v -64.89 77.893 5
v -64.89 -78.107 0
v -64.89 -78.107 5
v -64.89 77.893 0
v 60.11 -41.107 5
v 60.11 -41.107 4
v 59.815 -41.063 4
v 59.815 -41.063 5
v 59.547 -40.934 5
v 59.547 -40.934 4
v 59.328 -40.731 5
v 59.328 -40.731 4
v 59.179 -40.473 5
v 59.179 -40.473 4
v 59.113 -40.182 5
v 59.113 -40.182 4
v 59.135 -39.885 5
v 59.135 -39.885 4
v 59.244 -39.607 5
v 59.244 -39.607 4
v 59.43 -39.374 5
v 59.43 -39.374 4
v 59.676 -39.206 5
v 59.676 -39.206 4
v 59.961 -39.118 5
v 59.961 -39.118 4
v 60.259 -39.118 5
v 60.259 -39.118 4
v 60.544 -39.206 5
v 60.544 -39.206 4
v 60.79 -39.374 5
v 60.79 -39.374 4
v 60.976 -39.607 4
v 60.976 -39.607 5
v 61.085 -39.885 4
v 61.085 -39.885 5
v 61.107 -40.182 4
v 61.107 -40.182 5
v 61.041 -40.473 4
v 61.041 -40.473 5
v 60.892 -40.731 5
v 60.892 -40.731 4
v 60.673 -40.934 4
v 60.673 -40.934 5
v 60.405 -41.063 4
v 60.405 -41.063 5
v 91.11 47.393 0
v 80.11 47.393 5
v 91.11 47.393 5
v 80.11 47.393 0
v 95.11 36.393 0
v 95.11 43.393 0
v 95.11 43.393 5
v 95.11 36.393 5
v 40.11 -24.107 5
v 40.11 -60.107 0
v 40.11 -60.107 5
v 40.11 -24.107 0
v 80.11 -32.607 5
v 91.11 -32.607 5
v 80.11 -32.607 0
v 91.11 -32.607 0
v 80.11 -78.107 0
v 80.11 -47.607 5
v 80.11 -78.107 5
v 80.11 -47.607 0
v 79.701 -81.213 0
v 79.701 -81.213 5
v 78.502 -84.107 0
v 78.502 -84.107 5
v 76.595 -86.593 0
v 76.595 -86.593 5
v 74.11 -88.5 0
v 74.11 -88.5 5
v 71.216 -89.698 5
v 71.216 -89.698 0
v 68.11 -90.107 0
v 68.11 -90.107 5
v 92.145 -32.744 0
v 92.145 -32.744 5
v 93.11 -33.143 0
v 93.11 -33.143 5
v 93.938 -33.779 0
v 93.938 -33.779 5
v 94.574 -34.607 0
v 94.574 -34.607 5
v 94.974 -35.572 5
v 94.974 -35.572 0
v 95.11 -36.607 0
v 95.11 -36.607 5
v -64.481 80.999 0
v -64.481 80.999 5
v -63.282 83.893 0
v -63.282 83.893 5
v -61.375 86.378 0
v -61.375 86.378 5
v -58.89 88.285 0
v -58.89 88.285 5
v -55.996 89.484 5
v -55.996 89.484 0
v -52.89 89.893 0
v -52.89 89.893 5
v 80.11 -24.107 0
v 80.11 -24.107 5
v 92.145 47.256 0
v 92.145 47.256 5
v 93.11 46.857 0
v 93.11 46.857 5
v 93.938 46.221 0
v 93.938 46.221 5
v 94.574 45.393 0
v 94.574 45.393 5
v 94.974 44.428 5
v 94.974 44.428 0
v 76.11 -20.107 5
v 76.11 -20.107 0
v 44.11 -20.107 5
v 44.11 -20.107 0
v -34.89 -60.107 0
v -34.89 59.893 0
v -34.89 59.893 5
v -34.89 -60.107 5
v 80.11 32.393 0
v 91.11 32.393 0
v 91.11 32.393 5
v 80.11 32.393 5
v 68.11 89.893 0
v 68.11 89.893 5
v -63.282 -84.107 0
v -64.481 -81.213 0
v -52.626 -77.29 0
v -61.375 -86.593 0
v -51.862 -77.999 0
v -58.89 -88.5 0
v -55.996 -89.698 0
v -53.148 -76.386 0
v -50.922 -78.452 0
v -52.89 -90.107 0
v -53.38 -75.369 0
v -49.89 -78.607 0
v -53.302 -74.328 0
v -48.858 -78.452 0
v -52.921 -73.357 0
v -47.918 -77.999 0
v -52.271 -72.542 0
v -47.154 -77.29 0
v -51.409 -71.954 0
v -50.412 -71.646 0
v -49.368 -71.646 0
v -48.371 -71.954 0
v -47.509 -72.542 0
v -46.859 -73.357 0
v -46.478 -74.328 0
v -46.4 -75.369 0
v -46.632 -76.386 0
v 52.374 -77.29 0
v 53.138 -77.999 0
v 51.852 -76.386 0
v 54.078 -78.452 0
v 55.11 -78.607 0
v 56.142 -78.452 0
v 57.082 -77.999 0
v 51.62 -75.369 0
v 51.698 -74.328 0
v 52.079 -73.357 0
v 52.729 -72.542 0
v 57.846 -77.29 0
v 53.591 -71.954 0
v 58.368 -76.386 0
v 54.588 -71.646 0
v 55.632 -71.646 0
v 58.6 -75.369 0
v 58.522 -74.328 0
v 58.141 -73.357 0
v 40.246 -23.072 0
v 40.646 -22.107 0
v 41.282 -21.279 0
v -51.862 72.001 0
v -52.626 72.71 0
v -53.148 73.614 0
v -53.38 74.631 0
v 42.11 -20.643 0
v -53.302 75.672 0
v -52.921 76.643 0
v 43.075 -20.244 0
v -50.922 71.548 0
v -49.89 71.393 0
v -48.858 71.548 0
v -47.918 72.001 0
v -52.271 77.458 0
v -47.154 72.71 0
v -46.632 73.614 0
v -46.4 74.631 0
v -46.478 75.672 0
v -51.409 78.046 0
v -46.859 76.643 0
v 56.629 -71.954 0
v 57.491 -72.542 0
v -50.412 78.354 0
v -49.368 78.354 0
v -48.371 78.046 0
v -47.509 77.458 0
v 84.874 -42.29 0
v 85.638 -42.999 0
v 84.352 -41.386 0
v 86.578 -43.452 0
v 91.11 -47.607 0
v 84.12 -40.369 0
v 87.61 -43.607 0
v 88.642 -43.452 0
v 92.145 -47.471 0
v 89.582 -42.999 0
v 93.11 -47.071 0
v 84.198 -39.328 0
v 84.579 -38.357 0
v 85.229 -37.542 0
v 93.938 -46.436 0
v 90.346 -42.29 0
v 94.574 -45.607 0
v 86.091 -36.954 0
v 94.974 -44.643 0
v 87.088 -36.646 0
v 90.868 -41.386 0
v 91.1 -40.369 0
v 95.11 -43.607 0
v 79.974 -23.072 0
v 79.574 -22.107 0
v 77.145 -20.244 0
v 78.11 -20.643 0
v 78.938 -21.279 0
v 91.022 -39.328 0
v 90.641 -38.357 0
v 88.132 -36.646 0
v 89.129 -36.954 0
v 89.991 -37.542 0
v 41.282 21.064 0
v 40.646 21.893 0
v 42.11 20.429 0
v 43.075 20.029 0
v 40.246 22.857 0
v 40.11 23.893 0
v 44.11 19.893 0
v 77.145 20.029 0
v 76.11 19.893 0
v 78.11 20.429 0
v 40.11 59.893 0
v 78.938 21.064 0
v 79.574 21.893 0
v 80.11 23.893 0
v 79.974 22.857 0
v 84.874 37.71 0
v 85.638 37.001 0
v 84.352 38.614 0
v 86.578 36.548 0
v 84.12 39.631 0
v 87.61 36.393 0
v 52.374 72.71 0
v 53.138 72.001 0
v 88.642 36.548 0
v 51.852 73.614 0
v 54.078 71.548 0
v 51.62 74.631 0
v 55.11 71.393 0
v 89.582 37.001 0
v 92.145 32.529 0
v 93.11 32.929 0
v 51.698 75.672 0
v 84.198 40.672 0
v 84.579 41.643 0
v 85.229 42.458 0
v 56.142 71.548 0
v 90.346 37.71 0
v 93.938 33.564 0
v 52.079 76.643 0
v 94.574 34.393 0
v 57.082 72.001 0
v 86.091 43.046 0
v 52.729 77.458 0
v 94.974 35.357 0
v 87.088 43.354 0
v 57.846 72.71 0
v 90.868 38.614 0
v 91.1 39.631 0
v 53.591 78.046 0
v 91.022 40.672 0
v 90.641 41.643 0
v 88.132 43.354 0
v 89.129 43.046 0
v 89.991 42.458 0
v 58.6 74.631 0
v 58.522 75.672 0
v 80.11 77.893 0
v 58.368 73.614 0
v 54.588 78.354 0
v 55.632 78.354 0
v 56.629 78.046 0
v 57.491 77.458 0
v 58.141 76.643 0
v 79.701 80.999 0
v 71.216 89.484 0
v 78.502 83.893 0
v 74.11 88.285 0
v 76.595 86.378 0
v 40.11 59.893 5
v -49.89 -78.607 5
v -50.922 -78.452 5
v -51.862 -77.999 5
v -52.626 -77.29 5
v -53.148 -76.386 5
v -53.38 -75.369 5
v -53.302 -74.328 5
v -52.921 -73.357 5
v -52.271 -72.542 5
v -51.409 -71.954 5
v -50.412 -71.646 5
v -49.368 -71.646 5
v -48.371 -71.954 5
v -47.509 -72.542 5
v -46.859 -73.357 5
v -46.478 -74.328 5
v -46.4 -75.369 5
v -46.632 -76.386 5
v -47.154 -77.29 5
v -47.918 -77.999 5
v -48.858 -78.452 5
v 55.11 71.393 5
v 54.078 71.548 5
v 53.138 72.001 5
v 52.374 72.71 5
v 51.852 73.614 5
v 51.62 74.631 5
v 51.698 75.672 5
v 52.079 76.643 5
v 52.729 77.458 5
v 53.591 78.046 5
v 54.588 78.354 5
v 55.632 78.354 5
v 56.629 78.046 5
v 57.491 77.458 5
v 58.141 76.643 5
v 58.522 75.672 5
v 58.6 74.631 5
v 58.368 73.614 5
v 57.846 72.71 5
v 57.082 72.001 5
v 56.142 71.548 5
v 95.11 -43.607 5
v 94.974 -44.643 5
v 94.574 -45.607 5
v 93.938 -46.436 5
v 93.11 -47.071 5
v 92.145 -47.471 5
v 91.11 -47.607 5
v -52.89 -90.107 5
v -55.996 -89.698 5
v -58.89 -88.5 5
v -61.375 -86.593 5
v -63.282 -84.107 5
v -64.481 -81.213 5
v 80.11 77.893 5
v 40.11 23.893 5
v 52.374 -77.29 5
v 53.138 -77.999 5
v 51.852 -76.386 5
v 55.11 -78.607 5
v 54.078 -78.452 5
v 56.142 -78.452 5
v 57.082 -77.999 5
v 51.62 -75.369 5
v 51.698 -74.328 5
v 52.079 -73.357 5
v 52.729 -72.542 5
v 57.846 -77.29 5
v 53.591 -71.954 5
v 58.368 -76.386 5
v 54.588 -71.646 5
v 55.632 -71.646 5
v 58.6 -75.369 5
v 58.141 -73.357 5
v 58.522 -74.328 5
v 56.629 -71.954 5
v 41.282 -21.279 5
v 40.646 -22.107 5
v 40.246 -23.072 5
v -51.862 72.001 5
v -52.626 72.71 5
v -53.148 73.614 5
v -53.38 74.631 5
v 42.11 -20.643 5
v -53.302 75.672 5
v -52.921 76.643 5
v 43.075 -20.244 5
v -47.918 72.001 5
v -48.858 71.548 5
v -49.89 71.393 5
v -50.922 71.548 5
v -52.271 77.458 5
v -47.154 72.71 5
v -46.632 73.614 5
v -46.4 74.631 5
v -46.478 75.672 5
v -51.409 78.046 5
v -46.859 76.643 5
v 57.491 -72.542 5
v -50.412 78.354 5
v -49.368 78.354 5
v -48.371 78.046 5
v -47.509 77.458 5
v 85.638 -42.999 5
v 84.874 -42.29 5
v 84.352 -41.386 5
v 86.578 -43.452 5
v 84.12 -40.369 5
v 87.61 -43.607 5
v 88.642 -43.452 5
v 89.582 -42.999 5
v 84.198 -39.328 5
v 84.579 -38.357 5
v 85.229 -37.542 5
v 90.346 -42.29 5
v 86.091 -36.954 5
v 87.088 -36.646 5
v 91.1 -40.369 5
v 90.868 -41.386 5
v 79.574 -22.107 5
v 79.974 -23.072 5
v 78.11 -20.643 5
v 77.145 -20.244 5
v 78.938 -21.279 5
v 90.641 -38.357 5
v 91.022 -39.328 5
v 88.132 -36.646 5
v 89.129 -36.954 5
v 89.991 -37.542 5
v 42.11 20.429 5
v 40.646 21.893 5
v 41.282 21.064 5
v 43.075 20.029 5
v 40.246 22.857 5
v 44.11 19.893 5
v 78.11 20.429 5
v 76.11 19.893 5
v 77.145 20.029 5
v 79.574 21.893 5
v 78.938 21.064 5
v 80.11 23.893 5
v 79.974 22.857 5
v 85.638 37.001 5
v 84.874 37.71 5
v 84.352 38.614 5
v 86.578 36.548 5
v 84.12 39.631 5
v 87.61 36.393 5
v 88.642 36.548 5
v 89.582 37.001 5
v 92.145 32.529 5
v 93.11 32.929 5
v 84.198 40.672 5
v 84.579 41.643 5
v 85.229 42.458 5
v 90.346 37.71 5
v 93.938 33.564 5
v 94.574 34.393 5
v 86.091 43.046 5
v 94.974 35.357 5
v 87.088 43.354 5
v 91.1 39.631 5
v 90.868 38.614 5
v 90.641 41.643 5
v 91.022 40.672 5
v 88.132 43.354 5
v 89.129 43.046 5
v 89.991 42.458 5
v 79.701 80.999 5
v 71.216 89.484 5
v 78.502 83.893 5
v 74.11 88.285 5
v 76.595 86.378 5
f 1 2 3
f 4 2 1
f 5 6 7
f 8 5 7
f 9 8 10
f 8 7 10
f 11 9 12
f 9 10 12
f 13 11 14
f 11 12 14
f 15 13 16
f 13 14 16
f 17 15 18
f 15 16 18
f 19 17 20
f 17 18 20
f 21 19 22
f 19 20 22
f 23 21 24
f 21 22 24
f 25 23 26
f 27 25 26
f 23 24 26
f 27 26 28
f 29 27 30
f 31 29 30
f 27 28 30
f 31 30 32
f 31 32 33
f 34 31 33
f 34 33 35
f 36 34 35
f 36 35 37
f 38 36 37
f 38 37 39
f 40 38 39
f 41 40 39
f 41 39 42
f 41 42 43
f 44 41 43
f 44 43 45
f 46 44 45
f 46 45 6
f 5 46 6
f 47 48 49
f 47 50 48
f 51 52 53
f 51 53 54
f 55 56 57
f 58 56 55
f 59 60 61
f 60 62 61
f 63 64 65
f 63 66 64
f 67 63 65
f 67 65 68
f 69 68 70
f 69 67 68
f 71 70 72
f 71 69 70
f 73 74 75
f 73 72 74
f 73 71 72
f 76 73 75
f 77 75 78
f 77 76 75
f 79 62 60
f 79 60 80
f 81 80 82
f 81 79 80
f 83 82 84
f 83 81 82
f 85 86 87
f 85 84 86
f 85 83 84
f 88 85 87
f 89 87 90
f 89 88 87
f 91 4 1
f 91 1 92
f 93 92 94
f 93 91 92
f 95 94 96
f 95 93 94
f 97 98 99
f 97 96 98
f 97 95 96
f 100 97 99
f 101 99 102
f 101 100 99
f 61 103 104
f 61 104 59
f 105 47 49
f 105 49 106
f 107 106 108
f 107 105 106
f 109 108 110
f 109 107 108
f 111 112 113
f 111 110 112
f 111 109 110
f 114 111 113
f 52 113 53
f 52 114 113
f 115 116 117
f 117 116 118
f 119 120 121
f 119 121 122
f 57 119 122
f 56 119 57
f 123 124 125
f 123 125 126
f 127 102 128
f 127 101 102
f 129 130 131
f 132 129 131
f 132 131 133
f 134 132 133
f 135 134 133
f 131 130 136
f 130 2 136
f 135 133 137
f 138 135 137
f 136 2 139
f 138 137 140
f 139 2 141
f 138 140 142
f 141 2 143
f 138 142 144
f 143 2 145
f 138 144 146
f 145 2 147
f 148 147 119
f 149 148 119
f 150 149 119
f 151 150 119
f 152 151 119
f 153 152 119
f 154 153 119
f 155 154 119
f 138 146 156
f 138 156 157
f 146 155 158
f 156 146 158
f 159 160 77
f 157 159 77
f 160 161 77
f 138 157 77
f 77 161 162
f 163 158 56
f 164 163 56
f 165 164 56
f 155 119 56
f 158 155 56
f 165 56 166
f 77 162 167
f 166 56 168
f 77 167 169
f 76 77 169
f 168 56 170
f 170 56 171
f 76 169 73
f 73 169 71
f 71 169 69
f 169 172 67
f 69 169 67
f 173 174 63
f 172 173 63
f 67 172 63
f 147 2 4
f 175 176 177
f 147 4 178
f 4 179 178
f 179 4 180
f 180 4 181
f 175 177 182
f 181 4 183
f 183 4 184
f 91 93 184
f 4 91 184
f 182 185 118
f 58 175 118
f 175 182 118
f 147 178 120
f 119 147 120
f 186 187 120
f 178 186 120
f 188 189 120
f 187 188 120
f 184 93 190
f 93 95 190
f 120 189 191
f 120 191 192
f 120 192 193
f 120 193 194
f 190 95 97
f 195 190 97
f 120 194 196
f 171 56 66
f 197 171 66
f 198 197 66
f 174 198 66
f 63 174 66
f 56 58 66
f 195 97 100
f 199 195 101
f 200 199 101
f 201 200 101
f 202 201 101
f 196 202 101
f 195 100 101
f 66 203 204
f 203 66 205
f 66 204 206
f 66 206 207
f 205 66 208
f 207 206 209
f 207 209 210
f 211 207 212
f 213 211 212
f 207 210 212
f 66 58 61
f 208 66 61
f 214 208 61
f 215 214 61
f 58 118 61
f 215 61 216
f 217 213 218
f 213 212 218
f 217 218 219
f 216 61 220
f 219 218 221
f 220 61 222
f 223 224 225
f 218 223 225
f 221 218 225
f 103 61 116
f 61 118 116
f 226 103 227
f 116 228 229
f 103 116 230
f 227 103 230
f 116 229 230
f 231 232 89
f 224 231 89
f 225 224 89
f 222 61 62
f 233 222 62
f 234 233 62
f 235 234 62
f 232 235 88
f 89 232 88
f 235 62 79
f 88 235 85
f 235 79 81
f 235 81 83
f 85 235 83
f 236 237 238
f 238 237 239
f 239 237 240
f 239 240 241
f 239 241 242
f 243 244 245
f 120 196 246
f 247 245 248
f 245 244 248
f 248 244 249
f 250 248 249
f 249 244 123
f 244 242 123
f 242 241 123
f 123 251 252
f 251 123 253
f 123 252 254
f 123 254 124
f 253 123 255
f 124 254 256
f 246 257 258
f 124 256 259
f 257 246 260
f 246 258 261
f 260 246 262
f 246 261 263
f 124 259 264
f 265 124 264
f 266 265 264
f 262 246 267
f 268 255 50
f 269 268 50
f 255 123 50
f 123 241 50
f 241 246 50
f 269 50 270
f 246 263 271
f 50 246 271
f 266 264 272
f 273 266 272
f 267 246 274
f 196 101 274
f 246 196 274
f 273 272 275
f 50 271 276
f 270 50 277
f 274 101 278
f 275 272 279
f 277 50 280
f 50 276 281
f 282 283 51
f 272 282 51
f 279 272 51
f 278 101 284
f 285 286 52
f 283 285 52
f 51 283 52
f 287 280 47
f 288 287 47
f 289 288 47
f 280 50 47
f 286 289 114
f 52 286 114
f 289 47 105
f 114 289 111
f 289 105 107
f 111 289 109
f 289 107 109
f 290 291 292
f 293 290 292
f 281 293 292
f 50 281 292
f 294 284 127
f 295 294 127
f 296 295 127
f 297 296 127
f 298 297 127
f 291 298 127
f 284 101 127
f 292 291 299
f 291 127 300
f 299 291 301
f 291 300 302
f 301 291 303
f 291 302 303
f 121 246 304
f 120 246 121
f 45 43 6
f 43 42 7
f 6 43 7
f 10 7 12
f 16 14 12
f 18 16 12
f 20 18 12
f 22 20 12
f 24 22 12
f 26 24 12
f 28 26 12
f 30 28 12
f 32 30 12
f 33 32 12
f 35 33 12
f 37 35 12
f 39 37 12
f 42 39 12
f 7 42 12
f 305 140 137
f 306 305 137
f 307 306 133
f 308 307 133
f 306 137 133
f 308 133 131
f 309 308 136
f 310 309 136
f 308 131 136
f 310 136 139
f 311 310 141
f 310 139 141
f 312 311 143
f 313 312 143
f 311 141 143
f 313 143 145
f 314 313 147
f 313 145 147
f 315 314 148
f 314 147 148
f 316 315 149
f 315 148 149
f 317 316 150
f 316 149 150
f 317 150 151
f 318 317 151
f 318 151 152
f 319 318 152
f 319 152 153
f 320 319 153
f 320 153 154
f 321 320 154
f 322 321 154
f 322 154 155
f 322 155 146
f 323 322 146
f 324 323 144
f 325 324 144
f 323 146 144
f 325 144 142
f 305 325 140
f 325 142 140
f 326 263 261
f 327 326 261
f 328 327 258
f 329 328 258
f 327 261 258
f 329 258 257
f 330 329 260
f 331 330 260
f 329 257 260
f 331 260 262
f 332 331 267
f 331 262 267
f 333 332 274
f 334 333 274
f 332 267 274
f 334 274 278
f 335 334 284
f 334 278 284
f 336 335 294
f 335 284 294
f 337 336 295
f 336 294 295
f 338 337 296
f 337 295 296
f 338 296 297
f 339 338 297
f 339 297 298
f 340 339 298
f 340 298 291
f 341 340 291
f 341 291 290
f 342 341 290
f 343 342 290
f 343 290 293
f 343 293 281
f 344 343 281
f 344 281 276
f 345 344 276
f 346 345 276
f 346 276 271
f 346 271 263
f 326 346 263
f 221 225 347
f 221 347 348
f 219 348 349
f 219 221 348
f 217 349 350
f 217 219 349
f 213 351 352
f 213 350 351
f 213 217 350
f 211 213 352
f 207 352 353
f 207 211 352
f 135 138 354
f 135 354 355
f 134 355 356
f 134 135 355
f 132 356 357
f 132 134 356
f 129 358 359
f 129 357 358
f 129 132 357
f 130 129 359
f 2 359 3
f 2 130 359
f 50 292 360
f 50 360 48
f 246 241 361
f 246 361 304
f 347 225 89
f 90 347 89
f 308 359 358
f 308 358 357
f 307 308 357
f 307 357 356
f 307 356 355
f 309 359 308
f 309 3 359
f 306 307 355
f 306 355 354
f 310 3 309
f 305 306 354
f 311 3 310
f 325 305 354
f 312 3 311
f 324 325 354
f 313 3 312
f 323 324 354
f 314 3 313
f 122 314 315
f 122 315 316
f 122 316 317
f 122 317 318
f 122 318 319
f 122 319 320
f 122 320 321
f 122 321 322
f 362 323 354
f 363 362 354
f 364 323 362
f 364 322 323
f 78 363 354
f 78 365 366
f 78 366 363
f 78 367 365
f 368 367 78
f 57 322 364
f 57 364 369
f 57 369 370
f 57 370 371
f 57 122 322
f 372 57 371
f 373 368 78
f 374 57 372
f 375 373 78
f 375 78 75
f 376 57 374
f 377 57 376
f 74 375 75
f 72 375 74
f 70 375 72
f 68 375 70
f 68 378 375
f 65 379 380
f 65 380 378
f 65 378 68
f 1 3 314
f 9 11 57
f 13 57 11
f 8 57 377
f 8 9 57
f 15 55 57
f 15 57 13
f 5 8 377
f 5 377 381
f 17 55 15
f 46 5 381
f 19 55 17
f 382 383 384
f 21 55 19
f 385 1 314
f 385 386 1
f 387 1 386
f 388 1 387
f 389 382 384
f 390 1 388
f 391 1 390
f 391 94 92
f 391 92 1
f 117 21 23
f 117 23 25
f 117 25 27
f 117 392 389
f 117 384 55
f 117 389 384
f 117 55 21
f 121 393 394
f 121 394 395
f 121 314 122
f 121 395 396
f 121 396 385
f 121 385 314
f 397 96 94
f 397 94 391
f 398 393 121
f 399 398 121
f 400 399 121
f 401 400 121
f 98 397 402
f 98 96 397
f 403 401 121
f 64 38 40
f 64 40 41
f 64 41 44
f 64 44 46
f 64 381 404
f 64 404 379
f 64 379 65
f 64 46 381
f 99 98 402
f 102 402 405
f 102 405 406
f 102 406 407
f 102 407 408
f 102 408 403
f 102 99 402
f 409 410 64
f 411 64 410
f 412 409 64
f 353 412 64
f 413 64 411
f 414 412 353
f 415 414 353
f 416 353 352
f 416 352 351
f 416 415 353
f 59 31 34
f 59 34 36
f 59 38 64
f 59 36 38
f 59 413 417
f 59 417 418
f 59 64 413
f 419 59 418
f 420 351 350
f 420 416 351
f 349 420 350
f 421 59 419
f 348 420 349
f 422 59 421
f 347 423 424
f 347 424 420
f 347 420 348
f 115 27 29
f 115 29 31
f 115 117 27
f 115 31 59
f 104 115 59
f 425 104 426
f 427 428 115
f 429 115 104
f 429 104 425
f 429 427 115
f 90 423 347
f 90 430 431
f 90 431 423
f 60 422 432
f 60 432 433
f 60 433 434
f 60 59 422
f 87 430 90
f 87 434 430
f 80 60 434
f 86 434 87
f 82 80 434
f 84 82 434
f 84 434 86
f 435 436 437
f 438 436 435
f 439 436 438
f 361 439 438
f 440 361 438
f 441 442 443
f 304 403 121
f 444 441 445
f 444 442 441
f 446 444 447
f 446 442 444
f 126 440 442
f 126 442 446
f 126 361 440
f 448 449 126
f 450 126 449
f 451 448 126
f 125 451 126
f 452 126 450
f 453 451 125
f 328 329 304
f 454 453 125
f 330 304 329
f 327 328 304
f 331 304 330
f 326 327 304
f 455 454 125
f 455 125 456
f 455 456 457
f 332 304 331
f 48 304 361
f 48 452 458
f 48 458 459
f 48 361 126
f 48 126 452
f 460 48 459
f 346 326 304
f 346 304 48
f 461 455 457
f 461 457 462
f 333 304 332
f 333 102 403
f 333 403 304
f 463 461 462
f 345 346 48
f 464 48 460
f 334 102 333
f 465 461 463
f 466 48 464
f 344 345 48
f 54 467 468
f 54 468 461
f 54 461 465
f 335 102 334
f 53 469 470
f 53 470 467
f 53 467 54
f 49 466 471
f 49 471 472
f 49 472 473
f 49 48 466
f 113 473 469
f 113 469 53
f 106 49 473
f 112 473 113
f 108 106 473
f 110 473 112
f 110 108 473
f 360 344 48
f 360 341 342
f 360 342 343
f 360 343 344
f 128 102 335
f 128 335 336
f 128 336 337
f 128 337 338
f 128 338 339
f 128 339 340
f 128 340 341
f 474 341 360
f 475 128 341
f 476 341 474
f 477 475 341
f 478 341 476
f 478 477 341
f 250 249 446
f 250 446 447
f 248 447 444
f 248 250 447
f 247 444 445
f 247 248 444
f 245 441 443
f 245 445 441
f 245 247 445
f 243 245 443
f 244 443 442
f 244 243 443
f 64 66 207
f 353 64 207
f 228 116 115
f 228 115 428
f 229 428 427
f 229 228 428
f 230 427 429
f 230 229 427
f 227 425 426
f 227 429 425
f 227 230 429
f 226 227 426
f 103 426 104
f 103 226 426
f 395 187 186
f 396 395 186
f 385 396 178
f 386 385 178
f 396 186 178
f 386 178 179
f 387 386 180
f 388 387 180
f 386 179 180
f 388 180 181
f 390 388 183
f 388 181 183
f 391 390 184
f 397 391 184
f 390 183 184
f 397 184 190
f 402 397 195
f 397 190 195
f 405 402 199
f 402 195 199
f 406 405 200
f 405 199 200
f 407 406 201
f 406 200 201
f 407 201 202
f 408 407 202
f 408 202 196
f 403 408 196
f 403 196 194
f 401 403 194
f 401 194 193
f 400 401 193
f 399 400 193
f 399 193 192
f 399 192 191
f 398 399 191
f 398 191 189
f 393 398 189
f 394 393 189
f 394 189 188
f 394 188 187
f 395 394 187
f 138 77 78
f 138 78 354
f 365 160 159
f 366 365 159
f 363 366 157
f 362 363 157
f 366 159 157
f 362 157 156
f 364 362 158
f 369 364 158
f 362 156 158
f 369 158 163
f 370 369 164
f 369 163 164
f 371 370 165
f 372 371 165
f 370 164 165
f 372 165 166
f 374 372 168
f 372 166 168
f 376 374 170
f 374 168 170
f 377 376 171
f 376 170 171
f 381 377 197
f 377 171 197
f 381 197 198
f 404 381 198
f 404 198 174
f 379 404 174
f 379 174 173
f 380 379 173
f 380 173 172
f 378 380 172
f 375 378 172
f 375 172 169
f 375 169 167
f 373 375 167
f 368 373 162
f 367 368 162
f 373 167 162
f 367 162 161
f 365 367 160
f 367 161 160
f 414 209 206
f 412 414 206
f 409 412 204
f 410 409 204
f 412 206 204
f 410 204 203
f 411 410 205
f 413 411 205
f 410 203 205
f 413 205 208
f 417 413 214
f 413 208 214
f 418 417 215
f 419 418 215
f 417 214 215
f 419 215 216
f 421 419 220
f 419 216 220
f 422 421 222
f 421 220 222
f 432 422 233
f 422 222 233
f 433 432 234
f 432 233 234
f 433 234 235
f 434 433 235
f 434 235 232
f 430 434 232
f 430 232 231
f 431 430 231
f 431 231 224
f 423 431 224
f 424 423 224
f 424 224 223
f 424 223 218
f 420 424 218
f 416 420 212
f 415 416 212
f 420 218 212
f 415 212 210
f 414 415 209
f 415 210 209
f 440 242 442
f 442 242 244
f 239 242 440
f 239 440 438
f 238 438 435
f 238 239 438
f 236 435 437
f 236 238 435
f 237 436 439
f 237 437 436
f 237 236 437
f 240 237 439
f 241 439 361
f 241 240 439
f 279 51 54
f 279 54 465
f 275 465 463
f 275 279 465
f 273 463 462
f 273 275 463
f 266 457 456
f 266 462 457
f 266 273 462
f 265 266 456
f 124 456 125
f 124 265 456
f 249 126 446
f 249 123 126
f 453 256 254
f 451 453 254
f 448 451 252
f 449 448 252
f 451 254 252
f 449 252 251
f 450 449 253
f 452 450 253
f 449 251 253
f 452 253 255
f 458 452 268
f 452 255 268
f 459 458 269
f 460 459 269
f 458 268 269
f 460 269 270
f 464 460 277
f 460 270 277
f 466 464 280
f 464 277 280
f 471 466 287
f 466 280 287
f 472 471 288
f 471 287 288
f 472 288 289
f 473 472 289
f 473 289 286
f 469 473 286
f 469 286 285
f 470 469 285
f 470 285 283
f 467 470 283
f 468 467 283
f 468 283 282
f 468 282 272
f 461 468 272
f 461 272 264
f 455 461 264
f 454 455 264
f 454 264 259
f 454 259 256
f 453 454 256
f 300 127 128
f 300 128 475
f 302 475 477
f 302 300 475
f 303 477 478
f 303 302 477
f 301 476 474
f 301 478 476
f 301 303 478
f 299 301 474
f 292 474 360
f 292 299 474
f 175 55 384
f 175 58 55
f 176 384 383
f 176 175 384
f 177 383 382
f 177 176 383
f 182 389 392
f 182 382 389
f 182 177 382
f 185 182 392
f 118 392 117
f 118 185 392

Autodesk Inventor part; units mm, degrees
ref_plane "YZ Plane" through (0, 0, 0) normal (1, 0, 0) x (0, 1, 0)
ref_plane "XZ Plane" through (0, 0, 0) normal (0, 1, 0) x (-1, 0, 0)
ref_plane "XY Plane" through (0, 0, 0) normal (0, 0, 1) x (1, 0, 0)
sketch "Sketch1" plane through (0, 0, 0) normal (0, 0, 1) x (1, 0, 0)
  line L0 (40.11, 59.8927) -> (-34.89, 59.8927)
  line L1 (-34.89, 59.8927) -> (-34.89, -60.1073)
  line L2 (-34.89, -60.1073) -> (40.11, -60.1073)
  line L3 (-52.89, 89.8927) -> (68.11, 89.8927)
  line L4 (68.11, -90.1073) -> (-52.89, -90.1073)
  line L5 (-64.89, -78.1073) -> (-64.89, 77.8927)
  line L6 (80.11, 47.3927) -> (91.11, 47.3927)
  line L7 (95.11, 43.3927) -> (95.11, 36.3927)
  line L8 (91.11, 32.3927) -> (80.11, 32.3927)
  line L9 (115.11, -0.1073) -> (-34.89, -0.1073) construction
  line L10 (80.11, -47.6073) -> (91.11, -47.6073)
  line L11 (95.11, -43.6073) -> (95.11, -36.6073)
  line L12 (91.11, -32.6073) -> (80.11, -32.6073)
  line L13 (80.11, 77.8927) -> (80.11, 47.3927)
  line L14 (80.11, -47.6073) -> (80.11, -78.1073)
  arc A0 (95.11, 43.3927) -> (91.11, 47.3927) centre (91.11, 43.3927) ccw
  arc A1 (91.11, 32.3927) -> (95.11, 36.3927) centre (91.11, 36.3927) ccw
  arc A2 (95.11, -36.6073) -> (91.11, -32.6073) centre (91.11, -36.6073) ccw
  arc A3 (91.11, -47.6073) -> (95.11, -43.6073) centre (91.11, -43.6073) ccw
  arc A4 (80.11, 77.8927) -> (68.11, 89.8927) centre (68.11, 77.8927) ccw
  arc A5 (68.11, -90.1073) -> (80.11, -78.1073) centre (68.11, -78.1073) ccw
  arc A6 (-64.89, -78.1073) -> (-52.89, -90.1073) centre (-52.89, -78.1073) ccw
  arc A7 (-52.89, 89.8927) -> (-64.89, 77.8927) centre (-52.89, 77.8927) ccw
  line L15 (44.11, 19.8927) -> (76.11, 19.8927)
  line L16 (76.11, -20.1073) -> (44.11, -20.1073)
  line L17 (80.11, 32.3927) -> (80.11, 23.8927)
  line L18 (80.11, -24.1073) -> (80.11, -32.6073)
  line L19 (40.11, -60.1073) -> (40.11, -24.1073)
  line L20 (40.11, 23.8927) -> (40.11, 59.8927)
  arc A8 (76.11, 19.8927) -> (80.11, 23.8927) centre (76.11, 23.8927) ccw
  arc A9 (40.11, 23.8927) -> (44.11, 19.8927) centre (44.11, 23.8927) ccw
  arc A10 (44.11, -20.1073) -> (40.11, -24.1073) centre (44.11, -24.1073) ccw
  arc A11 (80.11, -24.1073) -> (76.11, -20.1073) centre (76.11, -24.1073) ccw
  line L21 (211.9676, -294.2124) -> (139.9676, -294.2124)
  line L22 (135.9676, -414.2124) -> (215.9676, -414.2124)
  line L23 (139.9676, -334.2124) -> (211.9676, -334.2124)
  line L24 (215.9676, -374.2124) -> (135.9676, -374.2124)
  line L25 (215.9676, -414.2124) -> (215.9676, -374.2124)
  line L26 (135.9676, -298.2124) -> (135.9676, -330.2124)
  line L27 (135.9676, -374.2124) -> (135.9676, -414.2124)
  line L28 (226.9676, -306.7124) -> (215.9676, -306.7124)
  line L29 (215.9676, -321.7124) -> (226.9676, -321.7124)
  line L30 (230.9676, -317.7124) -> (230.9676, -310.7124)
  line L31 (215.9676, -330.2124) -> (215.9676, -321.7124)
  line L32 (215.9676, -306.7124) -> (215.9676, -298.2124)
  arc A12 (230.9676, -310.7124) -> (226.9676, -306.7124) centre (226.9676, -310.7124) ccw
  arc A13 (226.9676, -321.7124) -> (230.9676, -317.7124) centre (226.9676, -317.7124) ccw
  arc A14 (211.9676, -334.2124) -> (215.9676, -330.2124) centre (211.9676, -330.2124) ccw
  arc A15 (135.9676, -330.2124) -> (139.9676, -334.2124) centre (139.9676, -330.2124) ccw
  arc A16 (139.9676, -294.2124) -> (135.9676, -298.2124) centre (139.9676, -298.2124) ccw
  arc A17 (215.9676, -298.2124) -> (211.9676, -294.2124) centre (211.9676, -298.2124) ccw
  point P0 (95.11, 32.3927)
  point P1 (95.11, 47.3927)
  point P2 (87.61, 39.8927)
  point P3 (87.61, -40.1073)
  point P4 (95.11, -32.6073)
  point P5 (95.11, -47.6073)
  point P6 (87.61, -40.1073)
  point P7 (135.9676, -294.2124)
  point P8 (135.9676, -334.2124)
  point P9 (230.9676, -306.7124)
  dimension "d22" = 75
  dimension "d23" = 120
  dimension "d24" = 30
  dimension "d25" = 15
  dimension "d26" = 15
  dimension "d27" = 80
  dimension "d28" = 4
  dimension "d29" = 4
  dimension "d30" = 12
  dimension "d31" = 40
  dimension "d32" = 4
  dimension "d33" = 7.5
  dimension "d34" = 7.5
  dimension "d52" = 80
  dimension "d53" = 120
  dimension "d54" = 40
  dimension "d55" = 40
  dimension "d56" = 15
  dimension "d58" = 15
  dimension "d59" = 12.5
  dimension "d60" = 12.5
  dimension "d61" = 4
  dimension "d62" = 40
  dimension "d63" = 15
extrude "Extrusion1" add sketch "Sketch1" along normal blind 5 contours L0 L1 L2 L19 A10 L16 A11 L18 L12 A2 L11 A3 L10 L14 A5 L4 A6 L5 A7 L3 A4 L13 L6 A0 L7 A1 L8 L17 A8 L15 A9 L20
sketch "Sketch3" plane through (0, 0, 5) normal (0, 0, 1) x (1, 0, 0)
  line L0 (95.11, 36.3927) -> (95.11, 43.3927) projected
  line L1 (95.11, -43.6073) -> (95.11, -36.6073) projected
  line L2 (91.11, 47.3927) -> (80.11, 47.3927) projected
  point P0 (0, 0)
  point P1 (87.61, 39.8927)
  point P2 (87.61, -40.1073)
  dimension "d35" = 7.5
  dimension "d36" = 7.5
  dimension "d37" = 80
  dimension "d38" = 7.5
hole "Hole1" at (87.61, 39.8927, 5) at (87.61, -40.1073, 5) direction (0, 0, -1) diameter 7 end through all
sketch "Sketch4" plane through (0, 0, 5) normal (0, 0, 1) x (1, 0, 0)
  line L0 (-64.89, 77.8927) -> (-64.89, -78.1073) projected
  line L1 (-64.89, -0.1073) -> (63.4668, -0.1073) construction
  line L2 (-52.89, -90.1073) -> (68.11, -90.1073) projected
  line L3 (68.11, 89.8927) -> (-52.89, 89.8927) projected
  point P0 (0, 0)
  point P1 (-49.89, 74.8927)
  point P2 (-49.89, -75.1073)
  point P3 (55.11, -75.1073)
  point P4 (55.11, 74.8927)
  dimension "d64" = 15
  dimension "d65" = 15
  dimension "d66" = 105
  dimension "d74" = 15
hole "Hole2" at (-49.89, 74.8927, 5) at (-49.89, -75.1073, 5) at (55.11, -75.1073, 5) at (55.11, 74.8927, 5) direction (0, 0, -1) diameter 7 end through all
sketch "Sketch5" plane through (0, 0, 5) normal (0, 0, 1) x (1, 0, 0)
  line L0 (76.11, -20.1073) -> (44.11, -20.1073) projected
  line L1 (40.11, -24.1073) -> (40.11, -60.1073) projected
  point P0 (0, 0)
  point P1 (60.11, -40.1073)
  dimension "d75" = 20
  dimension "d76" = 20
hole "Hole3" at (60.11, -40.1073, 5) direction (0, 0, -1) diameter 2 depth 1
equation "\"d59\" = d60"
properties part number "MarcoBC" material "MDF Medium Density Fiberboard"
